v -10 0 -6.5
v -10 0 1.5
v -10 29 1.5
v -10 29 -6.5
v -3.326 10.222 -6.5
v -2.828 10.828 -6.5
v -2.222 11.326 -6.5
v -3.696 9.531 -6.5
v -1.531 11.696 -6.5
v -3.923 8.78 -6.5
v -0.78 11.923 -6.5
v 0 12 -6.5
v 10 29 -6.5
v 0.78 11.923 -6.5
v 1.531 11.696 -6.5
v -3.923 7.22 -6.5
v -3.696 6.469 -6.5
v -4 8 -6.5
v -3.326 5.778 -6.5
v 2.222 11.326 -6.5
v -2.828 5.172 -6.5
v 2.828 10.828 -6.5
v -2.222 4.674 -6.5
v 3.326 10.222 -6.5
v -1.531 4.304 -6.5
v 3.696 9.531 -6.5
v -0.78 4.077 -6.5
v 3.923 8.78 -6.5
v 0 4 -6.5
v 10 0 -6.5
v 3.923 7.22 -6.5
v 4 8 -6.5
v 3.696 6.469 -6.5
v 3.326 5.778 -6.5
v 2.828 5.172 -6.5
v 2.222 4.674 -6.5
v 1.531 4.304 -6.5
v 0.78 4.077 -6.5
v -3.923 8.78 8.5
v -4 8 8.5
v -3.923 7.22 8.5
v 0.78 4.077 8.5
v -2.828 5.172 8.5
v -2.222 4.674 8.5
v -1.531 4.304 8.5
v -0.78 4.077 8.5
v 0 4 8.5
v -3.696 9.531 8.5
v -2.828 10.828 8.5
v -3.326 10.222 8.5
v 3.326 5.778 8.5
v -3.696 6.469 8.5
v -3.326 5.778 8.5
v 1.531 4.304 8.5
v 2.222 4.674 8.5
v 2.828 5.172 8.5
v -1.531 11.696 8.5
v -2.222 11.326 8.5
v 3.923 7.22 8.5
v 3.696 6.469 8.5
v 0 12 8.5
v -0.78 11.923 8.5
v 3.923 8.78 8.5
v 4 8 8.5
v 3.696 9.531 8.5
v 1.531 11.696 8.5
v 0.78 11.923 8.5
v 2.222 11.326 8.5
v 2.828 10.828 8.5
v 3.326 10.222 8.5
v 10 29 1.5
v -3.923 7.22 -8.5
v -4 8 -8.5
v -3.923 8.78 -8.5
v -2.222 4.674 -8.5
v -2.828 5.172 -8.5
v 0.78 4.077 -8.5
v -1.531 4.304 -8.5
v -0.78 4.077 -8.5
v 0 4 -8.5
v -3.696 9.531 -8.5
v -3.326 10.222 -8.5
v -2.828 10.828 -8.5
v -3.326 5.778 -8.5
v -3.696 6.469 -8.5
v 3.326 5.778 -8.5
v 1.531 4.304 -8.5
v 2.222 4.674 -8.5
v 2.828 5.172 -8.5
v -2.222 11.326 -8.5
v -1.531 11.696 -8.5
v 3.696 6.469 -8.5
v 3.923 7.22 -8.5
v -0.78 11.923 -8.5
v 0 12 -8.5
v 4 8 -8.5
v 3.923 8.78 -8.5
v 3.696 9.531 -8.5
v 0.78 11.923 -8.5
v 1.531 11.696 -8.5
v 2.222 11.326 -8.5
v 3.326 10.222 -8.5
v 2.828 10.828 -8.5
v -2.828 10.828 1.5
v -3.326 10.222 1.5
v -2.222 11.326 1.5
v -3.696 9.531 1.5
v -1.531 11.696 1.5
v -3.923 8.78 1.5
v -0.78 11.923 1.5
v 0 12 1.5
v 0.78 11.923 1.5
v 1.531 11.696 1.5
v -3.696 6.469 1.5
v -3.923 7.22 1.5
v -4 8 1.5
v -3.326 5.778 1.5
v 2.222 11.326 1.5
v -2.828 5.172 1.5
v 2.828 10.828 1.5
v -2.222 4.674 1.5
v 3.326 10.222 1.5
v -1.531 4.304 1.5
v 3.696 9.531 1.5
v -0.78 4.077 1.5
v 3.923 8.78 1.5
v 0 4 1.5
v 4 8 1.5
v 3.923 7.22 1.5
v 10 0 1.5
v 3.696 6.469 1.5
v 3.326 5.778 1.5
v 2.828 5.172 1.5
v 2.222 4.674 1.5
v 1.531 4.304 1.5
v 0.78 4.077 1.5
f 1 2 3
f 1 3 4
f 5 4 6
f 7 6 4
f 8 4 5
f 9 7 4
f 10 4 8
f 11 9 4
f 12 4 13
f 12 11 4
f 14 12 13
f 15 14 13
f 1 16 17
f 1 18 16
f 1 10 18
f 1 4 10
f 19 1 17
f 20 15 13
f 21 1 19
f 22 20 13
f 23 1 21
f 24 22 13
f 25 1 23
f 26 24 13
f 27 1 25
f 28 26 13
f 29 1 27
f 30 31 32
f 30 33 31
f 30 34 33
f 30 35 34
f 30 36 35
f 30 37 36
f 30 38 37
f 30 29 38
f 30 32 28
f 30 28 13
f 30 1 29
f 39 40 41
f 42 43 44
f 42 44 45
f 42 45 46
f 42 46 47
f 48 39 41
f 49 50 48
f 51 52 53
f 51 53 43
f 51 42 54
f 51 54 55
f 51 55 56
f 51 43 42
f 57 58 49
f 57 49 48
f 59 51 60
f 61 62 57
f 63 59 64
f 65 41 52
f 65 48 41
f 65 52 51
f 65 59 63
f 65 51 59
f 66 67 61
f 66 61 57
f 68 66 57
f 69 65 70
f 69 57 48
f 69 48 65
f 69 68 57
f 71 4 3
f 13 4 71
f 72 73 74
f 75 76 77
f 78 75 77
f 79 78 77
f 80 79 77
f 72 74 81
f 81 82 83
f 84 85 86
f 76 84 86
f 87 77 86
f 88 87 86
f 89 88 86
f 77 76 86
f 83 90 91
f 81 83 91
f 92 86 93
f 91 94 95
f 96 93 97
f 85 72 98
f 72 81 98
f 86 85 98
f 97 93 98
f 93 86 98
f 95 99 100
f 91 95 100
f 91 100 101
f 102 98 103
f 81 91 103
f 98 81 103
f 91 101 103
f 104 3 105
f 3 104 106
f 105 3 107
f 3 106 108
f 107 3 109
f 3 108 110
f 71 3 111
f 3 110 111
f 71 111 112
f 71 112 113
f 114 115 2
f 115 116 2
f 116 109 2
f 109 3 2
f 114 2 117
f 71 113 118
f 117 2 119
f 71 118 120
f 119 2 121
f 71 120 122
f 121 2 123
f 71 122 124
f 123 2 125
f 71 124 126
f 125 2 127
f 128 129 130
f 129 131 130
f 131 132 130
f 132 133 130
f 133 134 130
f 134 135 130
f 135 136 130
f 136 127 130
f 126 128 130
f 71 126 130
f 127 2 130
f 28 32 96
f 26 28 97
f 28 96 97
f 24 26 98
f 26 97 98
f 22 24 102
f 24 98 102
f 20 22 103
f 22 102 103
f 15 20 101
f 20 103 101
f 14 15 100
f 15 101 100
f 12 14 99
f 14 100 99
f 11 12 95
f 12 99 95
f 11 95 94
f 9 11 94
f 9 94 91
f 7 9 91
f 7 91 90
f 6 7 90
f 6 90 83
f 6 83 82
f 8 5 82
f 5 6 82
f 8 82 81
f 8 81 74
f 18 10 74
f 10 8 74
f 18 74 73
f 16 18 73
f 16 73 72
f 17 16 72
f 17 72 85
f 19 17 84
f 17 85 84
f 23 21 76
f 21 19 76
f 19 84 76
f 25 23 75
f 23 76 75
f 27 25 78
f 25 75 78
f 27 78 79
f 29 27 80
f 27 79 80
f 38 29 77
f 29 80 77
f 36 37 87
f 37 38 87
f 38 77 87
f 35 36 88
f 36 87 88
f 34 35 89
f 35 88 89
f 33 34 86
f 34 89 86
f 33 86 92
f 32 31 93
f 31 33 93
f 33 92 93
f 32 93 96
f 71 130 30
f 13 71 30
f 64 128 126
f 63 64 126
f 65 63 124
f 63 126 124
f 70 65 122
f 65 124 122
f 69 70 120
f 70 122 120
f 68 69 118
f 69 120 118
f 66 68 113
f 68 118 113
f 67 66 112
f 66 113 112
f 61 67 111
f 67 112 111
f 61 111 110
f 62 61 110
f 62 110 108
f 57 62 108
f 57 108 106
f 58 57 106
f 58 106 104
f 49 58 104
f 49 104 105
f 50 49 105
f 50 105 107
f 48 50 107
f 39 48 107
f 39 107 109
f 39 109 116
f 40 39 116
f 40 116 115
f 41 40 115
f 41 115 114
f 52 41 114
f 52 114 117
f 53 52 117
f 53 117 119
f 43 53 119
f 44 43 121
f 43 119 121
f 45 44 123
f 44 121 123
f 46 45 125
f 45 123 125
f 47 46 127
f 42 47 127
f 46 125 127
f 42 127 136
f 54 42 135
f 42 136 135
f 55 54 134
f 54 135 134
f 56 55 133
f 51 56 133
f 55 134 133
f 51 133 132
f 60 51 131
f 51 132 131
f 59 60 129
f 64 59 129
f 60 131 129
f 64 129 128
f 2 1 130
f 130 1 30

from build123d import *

# Parameters (mm, degrees)
SK_P01_HANGER_W       = 20
SK_P01_HANGER_H       = 8
P01_HANGER_DEPTH      = 29
P02_PIVOTPIN8MM_START = -8.5
SK_P02_PIVOTPIN8MM_R  = 4
P02_PIVOTPIN8MM_DEPTH = 17


with BuildPart() as part:
    # SK_P01_Hanger → P01_Hanger (new body)
    with BuildSketch(Plane(origin=(0, 0, 0), x_dir=(1, 0, 0), z_dir=(0, 1, 0))):
        with Locations((0, 2.5)):
            Rectangle(SK_P01_HANGER_W, SK_P01_HANGER_H)
    extrude(amount=P01_HANGER_DEPTH)

    # SK_P02_Pivotpin8mm → P02_Pivotpin8mm (add)
    with BuildSketch(Plane.XY.offset(P02_PIVOTPIN8MM_START)):
        with Locations((0, 8)):
            Circle(SK_P02_PIVOTPIN8MM_R)
    extrude(amount=P02_PIVOTPIN8MM_DEPTH)


solid = part.part
